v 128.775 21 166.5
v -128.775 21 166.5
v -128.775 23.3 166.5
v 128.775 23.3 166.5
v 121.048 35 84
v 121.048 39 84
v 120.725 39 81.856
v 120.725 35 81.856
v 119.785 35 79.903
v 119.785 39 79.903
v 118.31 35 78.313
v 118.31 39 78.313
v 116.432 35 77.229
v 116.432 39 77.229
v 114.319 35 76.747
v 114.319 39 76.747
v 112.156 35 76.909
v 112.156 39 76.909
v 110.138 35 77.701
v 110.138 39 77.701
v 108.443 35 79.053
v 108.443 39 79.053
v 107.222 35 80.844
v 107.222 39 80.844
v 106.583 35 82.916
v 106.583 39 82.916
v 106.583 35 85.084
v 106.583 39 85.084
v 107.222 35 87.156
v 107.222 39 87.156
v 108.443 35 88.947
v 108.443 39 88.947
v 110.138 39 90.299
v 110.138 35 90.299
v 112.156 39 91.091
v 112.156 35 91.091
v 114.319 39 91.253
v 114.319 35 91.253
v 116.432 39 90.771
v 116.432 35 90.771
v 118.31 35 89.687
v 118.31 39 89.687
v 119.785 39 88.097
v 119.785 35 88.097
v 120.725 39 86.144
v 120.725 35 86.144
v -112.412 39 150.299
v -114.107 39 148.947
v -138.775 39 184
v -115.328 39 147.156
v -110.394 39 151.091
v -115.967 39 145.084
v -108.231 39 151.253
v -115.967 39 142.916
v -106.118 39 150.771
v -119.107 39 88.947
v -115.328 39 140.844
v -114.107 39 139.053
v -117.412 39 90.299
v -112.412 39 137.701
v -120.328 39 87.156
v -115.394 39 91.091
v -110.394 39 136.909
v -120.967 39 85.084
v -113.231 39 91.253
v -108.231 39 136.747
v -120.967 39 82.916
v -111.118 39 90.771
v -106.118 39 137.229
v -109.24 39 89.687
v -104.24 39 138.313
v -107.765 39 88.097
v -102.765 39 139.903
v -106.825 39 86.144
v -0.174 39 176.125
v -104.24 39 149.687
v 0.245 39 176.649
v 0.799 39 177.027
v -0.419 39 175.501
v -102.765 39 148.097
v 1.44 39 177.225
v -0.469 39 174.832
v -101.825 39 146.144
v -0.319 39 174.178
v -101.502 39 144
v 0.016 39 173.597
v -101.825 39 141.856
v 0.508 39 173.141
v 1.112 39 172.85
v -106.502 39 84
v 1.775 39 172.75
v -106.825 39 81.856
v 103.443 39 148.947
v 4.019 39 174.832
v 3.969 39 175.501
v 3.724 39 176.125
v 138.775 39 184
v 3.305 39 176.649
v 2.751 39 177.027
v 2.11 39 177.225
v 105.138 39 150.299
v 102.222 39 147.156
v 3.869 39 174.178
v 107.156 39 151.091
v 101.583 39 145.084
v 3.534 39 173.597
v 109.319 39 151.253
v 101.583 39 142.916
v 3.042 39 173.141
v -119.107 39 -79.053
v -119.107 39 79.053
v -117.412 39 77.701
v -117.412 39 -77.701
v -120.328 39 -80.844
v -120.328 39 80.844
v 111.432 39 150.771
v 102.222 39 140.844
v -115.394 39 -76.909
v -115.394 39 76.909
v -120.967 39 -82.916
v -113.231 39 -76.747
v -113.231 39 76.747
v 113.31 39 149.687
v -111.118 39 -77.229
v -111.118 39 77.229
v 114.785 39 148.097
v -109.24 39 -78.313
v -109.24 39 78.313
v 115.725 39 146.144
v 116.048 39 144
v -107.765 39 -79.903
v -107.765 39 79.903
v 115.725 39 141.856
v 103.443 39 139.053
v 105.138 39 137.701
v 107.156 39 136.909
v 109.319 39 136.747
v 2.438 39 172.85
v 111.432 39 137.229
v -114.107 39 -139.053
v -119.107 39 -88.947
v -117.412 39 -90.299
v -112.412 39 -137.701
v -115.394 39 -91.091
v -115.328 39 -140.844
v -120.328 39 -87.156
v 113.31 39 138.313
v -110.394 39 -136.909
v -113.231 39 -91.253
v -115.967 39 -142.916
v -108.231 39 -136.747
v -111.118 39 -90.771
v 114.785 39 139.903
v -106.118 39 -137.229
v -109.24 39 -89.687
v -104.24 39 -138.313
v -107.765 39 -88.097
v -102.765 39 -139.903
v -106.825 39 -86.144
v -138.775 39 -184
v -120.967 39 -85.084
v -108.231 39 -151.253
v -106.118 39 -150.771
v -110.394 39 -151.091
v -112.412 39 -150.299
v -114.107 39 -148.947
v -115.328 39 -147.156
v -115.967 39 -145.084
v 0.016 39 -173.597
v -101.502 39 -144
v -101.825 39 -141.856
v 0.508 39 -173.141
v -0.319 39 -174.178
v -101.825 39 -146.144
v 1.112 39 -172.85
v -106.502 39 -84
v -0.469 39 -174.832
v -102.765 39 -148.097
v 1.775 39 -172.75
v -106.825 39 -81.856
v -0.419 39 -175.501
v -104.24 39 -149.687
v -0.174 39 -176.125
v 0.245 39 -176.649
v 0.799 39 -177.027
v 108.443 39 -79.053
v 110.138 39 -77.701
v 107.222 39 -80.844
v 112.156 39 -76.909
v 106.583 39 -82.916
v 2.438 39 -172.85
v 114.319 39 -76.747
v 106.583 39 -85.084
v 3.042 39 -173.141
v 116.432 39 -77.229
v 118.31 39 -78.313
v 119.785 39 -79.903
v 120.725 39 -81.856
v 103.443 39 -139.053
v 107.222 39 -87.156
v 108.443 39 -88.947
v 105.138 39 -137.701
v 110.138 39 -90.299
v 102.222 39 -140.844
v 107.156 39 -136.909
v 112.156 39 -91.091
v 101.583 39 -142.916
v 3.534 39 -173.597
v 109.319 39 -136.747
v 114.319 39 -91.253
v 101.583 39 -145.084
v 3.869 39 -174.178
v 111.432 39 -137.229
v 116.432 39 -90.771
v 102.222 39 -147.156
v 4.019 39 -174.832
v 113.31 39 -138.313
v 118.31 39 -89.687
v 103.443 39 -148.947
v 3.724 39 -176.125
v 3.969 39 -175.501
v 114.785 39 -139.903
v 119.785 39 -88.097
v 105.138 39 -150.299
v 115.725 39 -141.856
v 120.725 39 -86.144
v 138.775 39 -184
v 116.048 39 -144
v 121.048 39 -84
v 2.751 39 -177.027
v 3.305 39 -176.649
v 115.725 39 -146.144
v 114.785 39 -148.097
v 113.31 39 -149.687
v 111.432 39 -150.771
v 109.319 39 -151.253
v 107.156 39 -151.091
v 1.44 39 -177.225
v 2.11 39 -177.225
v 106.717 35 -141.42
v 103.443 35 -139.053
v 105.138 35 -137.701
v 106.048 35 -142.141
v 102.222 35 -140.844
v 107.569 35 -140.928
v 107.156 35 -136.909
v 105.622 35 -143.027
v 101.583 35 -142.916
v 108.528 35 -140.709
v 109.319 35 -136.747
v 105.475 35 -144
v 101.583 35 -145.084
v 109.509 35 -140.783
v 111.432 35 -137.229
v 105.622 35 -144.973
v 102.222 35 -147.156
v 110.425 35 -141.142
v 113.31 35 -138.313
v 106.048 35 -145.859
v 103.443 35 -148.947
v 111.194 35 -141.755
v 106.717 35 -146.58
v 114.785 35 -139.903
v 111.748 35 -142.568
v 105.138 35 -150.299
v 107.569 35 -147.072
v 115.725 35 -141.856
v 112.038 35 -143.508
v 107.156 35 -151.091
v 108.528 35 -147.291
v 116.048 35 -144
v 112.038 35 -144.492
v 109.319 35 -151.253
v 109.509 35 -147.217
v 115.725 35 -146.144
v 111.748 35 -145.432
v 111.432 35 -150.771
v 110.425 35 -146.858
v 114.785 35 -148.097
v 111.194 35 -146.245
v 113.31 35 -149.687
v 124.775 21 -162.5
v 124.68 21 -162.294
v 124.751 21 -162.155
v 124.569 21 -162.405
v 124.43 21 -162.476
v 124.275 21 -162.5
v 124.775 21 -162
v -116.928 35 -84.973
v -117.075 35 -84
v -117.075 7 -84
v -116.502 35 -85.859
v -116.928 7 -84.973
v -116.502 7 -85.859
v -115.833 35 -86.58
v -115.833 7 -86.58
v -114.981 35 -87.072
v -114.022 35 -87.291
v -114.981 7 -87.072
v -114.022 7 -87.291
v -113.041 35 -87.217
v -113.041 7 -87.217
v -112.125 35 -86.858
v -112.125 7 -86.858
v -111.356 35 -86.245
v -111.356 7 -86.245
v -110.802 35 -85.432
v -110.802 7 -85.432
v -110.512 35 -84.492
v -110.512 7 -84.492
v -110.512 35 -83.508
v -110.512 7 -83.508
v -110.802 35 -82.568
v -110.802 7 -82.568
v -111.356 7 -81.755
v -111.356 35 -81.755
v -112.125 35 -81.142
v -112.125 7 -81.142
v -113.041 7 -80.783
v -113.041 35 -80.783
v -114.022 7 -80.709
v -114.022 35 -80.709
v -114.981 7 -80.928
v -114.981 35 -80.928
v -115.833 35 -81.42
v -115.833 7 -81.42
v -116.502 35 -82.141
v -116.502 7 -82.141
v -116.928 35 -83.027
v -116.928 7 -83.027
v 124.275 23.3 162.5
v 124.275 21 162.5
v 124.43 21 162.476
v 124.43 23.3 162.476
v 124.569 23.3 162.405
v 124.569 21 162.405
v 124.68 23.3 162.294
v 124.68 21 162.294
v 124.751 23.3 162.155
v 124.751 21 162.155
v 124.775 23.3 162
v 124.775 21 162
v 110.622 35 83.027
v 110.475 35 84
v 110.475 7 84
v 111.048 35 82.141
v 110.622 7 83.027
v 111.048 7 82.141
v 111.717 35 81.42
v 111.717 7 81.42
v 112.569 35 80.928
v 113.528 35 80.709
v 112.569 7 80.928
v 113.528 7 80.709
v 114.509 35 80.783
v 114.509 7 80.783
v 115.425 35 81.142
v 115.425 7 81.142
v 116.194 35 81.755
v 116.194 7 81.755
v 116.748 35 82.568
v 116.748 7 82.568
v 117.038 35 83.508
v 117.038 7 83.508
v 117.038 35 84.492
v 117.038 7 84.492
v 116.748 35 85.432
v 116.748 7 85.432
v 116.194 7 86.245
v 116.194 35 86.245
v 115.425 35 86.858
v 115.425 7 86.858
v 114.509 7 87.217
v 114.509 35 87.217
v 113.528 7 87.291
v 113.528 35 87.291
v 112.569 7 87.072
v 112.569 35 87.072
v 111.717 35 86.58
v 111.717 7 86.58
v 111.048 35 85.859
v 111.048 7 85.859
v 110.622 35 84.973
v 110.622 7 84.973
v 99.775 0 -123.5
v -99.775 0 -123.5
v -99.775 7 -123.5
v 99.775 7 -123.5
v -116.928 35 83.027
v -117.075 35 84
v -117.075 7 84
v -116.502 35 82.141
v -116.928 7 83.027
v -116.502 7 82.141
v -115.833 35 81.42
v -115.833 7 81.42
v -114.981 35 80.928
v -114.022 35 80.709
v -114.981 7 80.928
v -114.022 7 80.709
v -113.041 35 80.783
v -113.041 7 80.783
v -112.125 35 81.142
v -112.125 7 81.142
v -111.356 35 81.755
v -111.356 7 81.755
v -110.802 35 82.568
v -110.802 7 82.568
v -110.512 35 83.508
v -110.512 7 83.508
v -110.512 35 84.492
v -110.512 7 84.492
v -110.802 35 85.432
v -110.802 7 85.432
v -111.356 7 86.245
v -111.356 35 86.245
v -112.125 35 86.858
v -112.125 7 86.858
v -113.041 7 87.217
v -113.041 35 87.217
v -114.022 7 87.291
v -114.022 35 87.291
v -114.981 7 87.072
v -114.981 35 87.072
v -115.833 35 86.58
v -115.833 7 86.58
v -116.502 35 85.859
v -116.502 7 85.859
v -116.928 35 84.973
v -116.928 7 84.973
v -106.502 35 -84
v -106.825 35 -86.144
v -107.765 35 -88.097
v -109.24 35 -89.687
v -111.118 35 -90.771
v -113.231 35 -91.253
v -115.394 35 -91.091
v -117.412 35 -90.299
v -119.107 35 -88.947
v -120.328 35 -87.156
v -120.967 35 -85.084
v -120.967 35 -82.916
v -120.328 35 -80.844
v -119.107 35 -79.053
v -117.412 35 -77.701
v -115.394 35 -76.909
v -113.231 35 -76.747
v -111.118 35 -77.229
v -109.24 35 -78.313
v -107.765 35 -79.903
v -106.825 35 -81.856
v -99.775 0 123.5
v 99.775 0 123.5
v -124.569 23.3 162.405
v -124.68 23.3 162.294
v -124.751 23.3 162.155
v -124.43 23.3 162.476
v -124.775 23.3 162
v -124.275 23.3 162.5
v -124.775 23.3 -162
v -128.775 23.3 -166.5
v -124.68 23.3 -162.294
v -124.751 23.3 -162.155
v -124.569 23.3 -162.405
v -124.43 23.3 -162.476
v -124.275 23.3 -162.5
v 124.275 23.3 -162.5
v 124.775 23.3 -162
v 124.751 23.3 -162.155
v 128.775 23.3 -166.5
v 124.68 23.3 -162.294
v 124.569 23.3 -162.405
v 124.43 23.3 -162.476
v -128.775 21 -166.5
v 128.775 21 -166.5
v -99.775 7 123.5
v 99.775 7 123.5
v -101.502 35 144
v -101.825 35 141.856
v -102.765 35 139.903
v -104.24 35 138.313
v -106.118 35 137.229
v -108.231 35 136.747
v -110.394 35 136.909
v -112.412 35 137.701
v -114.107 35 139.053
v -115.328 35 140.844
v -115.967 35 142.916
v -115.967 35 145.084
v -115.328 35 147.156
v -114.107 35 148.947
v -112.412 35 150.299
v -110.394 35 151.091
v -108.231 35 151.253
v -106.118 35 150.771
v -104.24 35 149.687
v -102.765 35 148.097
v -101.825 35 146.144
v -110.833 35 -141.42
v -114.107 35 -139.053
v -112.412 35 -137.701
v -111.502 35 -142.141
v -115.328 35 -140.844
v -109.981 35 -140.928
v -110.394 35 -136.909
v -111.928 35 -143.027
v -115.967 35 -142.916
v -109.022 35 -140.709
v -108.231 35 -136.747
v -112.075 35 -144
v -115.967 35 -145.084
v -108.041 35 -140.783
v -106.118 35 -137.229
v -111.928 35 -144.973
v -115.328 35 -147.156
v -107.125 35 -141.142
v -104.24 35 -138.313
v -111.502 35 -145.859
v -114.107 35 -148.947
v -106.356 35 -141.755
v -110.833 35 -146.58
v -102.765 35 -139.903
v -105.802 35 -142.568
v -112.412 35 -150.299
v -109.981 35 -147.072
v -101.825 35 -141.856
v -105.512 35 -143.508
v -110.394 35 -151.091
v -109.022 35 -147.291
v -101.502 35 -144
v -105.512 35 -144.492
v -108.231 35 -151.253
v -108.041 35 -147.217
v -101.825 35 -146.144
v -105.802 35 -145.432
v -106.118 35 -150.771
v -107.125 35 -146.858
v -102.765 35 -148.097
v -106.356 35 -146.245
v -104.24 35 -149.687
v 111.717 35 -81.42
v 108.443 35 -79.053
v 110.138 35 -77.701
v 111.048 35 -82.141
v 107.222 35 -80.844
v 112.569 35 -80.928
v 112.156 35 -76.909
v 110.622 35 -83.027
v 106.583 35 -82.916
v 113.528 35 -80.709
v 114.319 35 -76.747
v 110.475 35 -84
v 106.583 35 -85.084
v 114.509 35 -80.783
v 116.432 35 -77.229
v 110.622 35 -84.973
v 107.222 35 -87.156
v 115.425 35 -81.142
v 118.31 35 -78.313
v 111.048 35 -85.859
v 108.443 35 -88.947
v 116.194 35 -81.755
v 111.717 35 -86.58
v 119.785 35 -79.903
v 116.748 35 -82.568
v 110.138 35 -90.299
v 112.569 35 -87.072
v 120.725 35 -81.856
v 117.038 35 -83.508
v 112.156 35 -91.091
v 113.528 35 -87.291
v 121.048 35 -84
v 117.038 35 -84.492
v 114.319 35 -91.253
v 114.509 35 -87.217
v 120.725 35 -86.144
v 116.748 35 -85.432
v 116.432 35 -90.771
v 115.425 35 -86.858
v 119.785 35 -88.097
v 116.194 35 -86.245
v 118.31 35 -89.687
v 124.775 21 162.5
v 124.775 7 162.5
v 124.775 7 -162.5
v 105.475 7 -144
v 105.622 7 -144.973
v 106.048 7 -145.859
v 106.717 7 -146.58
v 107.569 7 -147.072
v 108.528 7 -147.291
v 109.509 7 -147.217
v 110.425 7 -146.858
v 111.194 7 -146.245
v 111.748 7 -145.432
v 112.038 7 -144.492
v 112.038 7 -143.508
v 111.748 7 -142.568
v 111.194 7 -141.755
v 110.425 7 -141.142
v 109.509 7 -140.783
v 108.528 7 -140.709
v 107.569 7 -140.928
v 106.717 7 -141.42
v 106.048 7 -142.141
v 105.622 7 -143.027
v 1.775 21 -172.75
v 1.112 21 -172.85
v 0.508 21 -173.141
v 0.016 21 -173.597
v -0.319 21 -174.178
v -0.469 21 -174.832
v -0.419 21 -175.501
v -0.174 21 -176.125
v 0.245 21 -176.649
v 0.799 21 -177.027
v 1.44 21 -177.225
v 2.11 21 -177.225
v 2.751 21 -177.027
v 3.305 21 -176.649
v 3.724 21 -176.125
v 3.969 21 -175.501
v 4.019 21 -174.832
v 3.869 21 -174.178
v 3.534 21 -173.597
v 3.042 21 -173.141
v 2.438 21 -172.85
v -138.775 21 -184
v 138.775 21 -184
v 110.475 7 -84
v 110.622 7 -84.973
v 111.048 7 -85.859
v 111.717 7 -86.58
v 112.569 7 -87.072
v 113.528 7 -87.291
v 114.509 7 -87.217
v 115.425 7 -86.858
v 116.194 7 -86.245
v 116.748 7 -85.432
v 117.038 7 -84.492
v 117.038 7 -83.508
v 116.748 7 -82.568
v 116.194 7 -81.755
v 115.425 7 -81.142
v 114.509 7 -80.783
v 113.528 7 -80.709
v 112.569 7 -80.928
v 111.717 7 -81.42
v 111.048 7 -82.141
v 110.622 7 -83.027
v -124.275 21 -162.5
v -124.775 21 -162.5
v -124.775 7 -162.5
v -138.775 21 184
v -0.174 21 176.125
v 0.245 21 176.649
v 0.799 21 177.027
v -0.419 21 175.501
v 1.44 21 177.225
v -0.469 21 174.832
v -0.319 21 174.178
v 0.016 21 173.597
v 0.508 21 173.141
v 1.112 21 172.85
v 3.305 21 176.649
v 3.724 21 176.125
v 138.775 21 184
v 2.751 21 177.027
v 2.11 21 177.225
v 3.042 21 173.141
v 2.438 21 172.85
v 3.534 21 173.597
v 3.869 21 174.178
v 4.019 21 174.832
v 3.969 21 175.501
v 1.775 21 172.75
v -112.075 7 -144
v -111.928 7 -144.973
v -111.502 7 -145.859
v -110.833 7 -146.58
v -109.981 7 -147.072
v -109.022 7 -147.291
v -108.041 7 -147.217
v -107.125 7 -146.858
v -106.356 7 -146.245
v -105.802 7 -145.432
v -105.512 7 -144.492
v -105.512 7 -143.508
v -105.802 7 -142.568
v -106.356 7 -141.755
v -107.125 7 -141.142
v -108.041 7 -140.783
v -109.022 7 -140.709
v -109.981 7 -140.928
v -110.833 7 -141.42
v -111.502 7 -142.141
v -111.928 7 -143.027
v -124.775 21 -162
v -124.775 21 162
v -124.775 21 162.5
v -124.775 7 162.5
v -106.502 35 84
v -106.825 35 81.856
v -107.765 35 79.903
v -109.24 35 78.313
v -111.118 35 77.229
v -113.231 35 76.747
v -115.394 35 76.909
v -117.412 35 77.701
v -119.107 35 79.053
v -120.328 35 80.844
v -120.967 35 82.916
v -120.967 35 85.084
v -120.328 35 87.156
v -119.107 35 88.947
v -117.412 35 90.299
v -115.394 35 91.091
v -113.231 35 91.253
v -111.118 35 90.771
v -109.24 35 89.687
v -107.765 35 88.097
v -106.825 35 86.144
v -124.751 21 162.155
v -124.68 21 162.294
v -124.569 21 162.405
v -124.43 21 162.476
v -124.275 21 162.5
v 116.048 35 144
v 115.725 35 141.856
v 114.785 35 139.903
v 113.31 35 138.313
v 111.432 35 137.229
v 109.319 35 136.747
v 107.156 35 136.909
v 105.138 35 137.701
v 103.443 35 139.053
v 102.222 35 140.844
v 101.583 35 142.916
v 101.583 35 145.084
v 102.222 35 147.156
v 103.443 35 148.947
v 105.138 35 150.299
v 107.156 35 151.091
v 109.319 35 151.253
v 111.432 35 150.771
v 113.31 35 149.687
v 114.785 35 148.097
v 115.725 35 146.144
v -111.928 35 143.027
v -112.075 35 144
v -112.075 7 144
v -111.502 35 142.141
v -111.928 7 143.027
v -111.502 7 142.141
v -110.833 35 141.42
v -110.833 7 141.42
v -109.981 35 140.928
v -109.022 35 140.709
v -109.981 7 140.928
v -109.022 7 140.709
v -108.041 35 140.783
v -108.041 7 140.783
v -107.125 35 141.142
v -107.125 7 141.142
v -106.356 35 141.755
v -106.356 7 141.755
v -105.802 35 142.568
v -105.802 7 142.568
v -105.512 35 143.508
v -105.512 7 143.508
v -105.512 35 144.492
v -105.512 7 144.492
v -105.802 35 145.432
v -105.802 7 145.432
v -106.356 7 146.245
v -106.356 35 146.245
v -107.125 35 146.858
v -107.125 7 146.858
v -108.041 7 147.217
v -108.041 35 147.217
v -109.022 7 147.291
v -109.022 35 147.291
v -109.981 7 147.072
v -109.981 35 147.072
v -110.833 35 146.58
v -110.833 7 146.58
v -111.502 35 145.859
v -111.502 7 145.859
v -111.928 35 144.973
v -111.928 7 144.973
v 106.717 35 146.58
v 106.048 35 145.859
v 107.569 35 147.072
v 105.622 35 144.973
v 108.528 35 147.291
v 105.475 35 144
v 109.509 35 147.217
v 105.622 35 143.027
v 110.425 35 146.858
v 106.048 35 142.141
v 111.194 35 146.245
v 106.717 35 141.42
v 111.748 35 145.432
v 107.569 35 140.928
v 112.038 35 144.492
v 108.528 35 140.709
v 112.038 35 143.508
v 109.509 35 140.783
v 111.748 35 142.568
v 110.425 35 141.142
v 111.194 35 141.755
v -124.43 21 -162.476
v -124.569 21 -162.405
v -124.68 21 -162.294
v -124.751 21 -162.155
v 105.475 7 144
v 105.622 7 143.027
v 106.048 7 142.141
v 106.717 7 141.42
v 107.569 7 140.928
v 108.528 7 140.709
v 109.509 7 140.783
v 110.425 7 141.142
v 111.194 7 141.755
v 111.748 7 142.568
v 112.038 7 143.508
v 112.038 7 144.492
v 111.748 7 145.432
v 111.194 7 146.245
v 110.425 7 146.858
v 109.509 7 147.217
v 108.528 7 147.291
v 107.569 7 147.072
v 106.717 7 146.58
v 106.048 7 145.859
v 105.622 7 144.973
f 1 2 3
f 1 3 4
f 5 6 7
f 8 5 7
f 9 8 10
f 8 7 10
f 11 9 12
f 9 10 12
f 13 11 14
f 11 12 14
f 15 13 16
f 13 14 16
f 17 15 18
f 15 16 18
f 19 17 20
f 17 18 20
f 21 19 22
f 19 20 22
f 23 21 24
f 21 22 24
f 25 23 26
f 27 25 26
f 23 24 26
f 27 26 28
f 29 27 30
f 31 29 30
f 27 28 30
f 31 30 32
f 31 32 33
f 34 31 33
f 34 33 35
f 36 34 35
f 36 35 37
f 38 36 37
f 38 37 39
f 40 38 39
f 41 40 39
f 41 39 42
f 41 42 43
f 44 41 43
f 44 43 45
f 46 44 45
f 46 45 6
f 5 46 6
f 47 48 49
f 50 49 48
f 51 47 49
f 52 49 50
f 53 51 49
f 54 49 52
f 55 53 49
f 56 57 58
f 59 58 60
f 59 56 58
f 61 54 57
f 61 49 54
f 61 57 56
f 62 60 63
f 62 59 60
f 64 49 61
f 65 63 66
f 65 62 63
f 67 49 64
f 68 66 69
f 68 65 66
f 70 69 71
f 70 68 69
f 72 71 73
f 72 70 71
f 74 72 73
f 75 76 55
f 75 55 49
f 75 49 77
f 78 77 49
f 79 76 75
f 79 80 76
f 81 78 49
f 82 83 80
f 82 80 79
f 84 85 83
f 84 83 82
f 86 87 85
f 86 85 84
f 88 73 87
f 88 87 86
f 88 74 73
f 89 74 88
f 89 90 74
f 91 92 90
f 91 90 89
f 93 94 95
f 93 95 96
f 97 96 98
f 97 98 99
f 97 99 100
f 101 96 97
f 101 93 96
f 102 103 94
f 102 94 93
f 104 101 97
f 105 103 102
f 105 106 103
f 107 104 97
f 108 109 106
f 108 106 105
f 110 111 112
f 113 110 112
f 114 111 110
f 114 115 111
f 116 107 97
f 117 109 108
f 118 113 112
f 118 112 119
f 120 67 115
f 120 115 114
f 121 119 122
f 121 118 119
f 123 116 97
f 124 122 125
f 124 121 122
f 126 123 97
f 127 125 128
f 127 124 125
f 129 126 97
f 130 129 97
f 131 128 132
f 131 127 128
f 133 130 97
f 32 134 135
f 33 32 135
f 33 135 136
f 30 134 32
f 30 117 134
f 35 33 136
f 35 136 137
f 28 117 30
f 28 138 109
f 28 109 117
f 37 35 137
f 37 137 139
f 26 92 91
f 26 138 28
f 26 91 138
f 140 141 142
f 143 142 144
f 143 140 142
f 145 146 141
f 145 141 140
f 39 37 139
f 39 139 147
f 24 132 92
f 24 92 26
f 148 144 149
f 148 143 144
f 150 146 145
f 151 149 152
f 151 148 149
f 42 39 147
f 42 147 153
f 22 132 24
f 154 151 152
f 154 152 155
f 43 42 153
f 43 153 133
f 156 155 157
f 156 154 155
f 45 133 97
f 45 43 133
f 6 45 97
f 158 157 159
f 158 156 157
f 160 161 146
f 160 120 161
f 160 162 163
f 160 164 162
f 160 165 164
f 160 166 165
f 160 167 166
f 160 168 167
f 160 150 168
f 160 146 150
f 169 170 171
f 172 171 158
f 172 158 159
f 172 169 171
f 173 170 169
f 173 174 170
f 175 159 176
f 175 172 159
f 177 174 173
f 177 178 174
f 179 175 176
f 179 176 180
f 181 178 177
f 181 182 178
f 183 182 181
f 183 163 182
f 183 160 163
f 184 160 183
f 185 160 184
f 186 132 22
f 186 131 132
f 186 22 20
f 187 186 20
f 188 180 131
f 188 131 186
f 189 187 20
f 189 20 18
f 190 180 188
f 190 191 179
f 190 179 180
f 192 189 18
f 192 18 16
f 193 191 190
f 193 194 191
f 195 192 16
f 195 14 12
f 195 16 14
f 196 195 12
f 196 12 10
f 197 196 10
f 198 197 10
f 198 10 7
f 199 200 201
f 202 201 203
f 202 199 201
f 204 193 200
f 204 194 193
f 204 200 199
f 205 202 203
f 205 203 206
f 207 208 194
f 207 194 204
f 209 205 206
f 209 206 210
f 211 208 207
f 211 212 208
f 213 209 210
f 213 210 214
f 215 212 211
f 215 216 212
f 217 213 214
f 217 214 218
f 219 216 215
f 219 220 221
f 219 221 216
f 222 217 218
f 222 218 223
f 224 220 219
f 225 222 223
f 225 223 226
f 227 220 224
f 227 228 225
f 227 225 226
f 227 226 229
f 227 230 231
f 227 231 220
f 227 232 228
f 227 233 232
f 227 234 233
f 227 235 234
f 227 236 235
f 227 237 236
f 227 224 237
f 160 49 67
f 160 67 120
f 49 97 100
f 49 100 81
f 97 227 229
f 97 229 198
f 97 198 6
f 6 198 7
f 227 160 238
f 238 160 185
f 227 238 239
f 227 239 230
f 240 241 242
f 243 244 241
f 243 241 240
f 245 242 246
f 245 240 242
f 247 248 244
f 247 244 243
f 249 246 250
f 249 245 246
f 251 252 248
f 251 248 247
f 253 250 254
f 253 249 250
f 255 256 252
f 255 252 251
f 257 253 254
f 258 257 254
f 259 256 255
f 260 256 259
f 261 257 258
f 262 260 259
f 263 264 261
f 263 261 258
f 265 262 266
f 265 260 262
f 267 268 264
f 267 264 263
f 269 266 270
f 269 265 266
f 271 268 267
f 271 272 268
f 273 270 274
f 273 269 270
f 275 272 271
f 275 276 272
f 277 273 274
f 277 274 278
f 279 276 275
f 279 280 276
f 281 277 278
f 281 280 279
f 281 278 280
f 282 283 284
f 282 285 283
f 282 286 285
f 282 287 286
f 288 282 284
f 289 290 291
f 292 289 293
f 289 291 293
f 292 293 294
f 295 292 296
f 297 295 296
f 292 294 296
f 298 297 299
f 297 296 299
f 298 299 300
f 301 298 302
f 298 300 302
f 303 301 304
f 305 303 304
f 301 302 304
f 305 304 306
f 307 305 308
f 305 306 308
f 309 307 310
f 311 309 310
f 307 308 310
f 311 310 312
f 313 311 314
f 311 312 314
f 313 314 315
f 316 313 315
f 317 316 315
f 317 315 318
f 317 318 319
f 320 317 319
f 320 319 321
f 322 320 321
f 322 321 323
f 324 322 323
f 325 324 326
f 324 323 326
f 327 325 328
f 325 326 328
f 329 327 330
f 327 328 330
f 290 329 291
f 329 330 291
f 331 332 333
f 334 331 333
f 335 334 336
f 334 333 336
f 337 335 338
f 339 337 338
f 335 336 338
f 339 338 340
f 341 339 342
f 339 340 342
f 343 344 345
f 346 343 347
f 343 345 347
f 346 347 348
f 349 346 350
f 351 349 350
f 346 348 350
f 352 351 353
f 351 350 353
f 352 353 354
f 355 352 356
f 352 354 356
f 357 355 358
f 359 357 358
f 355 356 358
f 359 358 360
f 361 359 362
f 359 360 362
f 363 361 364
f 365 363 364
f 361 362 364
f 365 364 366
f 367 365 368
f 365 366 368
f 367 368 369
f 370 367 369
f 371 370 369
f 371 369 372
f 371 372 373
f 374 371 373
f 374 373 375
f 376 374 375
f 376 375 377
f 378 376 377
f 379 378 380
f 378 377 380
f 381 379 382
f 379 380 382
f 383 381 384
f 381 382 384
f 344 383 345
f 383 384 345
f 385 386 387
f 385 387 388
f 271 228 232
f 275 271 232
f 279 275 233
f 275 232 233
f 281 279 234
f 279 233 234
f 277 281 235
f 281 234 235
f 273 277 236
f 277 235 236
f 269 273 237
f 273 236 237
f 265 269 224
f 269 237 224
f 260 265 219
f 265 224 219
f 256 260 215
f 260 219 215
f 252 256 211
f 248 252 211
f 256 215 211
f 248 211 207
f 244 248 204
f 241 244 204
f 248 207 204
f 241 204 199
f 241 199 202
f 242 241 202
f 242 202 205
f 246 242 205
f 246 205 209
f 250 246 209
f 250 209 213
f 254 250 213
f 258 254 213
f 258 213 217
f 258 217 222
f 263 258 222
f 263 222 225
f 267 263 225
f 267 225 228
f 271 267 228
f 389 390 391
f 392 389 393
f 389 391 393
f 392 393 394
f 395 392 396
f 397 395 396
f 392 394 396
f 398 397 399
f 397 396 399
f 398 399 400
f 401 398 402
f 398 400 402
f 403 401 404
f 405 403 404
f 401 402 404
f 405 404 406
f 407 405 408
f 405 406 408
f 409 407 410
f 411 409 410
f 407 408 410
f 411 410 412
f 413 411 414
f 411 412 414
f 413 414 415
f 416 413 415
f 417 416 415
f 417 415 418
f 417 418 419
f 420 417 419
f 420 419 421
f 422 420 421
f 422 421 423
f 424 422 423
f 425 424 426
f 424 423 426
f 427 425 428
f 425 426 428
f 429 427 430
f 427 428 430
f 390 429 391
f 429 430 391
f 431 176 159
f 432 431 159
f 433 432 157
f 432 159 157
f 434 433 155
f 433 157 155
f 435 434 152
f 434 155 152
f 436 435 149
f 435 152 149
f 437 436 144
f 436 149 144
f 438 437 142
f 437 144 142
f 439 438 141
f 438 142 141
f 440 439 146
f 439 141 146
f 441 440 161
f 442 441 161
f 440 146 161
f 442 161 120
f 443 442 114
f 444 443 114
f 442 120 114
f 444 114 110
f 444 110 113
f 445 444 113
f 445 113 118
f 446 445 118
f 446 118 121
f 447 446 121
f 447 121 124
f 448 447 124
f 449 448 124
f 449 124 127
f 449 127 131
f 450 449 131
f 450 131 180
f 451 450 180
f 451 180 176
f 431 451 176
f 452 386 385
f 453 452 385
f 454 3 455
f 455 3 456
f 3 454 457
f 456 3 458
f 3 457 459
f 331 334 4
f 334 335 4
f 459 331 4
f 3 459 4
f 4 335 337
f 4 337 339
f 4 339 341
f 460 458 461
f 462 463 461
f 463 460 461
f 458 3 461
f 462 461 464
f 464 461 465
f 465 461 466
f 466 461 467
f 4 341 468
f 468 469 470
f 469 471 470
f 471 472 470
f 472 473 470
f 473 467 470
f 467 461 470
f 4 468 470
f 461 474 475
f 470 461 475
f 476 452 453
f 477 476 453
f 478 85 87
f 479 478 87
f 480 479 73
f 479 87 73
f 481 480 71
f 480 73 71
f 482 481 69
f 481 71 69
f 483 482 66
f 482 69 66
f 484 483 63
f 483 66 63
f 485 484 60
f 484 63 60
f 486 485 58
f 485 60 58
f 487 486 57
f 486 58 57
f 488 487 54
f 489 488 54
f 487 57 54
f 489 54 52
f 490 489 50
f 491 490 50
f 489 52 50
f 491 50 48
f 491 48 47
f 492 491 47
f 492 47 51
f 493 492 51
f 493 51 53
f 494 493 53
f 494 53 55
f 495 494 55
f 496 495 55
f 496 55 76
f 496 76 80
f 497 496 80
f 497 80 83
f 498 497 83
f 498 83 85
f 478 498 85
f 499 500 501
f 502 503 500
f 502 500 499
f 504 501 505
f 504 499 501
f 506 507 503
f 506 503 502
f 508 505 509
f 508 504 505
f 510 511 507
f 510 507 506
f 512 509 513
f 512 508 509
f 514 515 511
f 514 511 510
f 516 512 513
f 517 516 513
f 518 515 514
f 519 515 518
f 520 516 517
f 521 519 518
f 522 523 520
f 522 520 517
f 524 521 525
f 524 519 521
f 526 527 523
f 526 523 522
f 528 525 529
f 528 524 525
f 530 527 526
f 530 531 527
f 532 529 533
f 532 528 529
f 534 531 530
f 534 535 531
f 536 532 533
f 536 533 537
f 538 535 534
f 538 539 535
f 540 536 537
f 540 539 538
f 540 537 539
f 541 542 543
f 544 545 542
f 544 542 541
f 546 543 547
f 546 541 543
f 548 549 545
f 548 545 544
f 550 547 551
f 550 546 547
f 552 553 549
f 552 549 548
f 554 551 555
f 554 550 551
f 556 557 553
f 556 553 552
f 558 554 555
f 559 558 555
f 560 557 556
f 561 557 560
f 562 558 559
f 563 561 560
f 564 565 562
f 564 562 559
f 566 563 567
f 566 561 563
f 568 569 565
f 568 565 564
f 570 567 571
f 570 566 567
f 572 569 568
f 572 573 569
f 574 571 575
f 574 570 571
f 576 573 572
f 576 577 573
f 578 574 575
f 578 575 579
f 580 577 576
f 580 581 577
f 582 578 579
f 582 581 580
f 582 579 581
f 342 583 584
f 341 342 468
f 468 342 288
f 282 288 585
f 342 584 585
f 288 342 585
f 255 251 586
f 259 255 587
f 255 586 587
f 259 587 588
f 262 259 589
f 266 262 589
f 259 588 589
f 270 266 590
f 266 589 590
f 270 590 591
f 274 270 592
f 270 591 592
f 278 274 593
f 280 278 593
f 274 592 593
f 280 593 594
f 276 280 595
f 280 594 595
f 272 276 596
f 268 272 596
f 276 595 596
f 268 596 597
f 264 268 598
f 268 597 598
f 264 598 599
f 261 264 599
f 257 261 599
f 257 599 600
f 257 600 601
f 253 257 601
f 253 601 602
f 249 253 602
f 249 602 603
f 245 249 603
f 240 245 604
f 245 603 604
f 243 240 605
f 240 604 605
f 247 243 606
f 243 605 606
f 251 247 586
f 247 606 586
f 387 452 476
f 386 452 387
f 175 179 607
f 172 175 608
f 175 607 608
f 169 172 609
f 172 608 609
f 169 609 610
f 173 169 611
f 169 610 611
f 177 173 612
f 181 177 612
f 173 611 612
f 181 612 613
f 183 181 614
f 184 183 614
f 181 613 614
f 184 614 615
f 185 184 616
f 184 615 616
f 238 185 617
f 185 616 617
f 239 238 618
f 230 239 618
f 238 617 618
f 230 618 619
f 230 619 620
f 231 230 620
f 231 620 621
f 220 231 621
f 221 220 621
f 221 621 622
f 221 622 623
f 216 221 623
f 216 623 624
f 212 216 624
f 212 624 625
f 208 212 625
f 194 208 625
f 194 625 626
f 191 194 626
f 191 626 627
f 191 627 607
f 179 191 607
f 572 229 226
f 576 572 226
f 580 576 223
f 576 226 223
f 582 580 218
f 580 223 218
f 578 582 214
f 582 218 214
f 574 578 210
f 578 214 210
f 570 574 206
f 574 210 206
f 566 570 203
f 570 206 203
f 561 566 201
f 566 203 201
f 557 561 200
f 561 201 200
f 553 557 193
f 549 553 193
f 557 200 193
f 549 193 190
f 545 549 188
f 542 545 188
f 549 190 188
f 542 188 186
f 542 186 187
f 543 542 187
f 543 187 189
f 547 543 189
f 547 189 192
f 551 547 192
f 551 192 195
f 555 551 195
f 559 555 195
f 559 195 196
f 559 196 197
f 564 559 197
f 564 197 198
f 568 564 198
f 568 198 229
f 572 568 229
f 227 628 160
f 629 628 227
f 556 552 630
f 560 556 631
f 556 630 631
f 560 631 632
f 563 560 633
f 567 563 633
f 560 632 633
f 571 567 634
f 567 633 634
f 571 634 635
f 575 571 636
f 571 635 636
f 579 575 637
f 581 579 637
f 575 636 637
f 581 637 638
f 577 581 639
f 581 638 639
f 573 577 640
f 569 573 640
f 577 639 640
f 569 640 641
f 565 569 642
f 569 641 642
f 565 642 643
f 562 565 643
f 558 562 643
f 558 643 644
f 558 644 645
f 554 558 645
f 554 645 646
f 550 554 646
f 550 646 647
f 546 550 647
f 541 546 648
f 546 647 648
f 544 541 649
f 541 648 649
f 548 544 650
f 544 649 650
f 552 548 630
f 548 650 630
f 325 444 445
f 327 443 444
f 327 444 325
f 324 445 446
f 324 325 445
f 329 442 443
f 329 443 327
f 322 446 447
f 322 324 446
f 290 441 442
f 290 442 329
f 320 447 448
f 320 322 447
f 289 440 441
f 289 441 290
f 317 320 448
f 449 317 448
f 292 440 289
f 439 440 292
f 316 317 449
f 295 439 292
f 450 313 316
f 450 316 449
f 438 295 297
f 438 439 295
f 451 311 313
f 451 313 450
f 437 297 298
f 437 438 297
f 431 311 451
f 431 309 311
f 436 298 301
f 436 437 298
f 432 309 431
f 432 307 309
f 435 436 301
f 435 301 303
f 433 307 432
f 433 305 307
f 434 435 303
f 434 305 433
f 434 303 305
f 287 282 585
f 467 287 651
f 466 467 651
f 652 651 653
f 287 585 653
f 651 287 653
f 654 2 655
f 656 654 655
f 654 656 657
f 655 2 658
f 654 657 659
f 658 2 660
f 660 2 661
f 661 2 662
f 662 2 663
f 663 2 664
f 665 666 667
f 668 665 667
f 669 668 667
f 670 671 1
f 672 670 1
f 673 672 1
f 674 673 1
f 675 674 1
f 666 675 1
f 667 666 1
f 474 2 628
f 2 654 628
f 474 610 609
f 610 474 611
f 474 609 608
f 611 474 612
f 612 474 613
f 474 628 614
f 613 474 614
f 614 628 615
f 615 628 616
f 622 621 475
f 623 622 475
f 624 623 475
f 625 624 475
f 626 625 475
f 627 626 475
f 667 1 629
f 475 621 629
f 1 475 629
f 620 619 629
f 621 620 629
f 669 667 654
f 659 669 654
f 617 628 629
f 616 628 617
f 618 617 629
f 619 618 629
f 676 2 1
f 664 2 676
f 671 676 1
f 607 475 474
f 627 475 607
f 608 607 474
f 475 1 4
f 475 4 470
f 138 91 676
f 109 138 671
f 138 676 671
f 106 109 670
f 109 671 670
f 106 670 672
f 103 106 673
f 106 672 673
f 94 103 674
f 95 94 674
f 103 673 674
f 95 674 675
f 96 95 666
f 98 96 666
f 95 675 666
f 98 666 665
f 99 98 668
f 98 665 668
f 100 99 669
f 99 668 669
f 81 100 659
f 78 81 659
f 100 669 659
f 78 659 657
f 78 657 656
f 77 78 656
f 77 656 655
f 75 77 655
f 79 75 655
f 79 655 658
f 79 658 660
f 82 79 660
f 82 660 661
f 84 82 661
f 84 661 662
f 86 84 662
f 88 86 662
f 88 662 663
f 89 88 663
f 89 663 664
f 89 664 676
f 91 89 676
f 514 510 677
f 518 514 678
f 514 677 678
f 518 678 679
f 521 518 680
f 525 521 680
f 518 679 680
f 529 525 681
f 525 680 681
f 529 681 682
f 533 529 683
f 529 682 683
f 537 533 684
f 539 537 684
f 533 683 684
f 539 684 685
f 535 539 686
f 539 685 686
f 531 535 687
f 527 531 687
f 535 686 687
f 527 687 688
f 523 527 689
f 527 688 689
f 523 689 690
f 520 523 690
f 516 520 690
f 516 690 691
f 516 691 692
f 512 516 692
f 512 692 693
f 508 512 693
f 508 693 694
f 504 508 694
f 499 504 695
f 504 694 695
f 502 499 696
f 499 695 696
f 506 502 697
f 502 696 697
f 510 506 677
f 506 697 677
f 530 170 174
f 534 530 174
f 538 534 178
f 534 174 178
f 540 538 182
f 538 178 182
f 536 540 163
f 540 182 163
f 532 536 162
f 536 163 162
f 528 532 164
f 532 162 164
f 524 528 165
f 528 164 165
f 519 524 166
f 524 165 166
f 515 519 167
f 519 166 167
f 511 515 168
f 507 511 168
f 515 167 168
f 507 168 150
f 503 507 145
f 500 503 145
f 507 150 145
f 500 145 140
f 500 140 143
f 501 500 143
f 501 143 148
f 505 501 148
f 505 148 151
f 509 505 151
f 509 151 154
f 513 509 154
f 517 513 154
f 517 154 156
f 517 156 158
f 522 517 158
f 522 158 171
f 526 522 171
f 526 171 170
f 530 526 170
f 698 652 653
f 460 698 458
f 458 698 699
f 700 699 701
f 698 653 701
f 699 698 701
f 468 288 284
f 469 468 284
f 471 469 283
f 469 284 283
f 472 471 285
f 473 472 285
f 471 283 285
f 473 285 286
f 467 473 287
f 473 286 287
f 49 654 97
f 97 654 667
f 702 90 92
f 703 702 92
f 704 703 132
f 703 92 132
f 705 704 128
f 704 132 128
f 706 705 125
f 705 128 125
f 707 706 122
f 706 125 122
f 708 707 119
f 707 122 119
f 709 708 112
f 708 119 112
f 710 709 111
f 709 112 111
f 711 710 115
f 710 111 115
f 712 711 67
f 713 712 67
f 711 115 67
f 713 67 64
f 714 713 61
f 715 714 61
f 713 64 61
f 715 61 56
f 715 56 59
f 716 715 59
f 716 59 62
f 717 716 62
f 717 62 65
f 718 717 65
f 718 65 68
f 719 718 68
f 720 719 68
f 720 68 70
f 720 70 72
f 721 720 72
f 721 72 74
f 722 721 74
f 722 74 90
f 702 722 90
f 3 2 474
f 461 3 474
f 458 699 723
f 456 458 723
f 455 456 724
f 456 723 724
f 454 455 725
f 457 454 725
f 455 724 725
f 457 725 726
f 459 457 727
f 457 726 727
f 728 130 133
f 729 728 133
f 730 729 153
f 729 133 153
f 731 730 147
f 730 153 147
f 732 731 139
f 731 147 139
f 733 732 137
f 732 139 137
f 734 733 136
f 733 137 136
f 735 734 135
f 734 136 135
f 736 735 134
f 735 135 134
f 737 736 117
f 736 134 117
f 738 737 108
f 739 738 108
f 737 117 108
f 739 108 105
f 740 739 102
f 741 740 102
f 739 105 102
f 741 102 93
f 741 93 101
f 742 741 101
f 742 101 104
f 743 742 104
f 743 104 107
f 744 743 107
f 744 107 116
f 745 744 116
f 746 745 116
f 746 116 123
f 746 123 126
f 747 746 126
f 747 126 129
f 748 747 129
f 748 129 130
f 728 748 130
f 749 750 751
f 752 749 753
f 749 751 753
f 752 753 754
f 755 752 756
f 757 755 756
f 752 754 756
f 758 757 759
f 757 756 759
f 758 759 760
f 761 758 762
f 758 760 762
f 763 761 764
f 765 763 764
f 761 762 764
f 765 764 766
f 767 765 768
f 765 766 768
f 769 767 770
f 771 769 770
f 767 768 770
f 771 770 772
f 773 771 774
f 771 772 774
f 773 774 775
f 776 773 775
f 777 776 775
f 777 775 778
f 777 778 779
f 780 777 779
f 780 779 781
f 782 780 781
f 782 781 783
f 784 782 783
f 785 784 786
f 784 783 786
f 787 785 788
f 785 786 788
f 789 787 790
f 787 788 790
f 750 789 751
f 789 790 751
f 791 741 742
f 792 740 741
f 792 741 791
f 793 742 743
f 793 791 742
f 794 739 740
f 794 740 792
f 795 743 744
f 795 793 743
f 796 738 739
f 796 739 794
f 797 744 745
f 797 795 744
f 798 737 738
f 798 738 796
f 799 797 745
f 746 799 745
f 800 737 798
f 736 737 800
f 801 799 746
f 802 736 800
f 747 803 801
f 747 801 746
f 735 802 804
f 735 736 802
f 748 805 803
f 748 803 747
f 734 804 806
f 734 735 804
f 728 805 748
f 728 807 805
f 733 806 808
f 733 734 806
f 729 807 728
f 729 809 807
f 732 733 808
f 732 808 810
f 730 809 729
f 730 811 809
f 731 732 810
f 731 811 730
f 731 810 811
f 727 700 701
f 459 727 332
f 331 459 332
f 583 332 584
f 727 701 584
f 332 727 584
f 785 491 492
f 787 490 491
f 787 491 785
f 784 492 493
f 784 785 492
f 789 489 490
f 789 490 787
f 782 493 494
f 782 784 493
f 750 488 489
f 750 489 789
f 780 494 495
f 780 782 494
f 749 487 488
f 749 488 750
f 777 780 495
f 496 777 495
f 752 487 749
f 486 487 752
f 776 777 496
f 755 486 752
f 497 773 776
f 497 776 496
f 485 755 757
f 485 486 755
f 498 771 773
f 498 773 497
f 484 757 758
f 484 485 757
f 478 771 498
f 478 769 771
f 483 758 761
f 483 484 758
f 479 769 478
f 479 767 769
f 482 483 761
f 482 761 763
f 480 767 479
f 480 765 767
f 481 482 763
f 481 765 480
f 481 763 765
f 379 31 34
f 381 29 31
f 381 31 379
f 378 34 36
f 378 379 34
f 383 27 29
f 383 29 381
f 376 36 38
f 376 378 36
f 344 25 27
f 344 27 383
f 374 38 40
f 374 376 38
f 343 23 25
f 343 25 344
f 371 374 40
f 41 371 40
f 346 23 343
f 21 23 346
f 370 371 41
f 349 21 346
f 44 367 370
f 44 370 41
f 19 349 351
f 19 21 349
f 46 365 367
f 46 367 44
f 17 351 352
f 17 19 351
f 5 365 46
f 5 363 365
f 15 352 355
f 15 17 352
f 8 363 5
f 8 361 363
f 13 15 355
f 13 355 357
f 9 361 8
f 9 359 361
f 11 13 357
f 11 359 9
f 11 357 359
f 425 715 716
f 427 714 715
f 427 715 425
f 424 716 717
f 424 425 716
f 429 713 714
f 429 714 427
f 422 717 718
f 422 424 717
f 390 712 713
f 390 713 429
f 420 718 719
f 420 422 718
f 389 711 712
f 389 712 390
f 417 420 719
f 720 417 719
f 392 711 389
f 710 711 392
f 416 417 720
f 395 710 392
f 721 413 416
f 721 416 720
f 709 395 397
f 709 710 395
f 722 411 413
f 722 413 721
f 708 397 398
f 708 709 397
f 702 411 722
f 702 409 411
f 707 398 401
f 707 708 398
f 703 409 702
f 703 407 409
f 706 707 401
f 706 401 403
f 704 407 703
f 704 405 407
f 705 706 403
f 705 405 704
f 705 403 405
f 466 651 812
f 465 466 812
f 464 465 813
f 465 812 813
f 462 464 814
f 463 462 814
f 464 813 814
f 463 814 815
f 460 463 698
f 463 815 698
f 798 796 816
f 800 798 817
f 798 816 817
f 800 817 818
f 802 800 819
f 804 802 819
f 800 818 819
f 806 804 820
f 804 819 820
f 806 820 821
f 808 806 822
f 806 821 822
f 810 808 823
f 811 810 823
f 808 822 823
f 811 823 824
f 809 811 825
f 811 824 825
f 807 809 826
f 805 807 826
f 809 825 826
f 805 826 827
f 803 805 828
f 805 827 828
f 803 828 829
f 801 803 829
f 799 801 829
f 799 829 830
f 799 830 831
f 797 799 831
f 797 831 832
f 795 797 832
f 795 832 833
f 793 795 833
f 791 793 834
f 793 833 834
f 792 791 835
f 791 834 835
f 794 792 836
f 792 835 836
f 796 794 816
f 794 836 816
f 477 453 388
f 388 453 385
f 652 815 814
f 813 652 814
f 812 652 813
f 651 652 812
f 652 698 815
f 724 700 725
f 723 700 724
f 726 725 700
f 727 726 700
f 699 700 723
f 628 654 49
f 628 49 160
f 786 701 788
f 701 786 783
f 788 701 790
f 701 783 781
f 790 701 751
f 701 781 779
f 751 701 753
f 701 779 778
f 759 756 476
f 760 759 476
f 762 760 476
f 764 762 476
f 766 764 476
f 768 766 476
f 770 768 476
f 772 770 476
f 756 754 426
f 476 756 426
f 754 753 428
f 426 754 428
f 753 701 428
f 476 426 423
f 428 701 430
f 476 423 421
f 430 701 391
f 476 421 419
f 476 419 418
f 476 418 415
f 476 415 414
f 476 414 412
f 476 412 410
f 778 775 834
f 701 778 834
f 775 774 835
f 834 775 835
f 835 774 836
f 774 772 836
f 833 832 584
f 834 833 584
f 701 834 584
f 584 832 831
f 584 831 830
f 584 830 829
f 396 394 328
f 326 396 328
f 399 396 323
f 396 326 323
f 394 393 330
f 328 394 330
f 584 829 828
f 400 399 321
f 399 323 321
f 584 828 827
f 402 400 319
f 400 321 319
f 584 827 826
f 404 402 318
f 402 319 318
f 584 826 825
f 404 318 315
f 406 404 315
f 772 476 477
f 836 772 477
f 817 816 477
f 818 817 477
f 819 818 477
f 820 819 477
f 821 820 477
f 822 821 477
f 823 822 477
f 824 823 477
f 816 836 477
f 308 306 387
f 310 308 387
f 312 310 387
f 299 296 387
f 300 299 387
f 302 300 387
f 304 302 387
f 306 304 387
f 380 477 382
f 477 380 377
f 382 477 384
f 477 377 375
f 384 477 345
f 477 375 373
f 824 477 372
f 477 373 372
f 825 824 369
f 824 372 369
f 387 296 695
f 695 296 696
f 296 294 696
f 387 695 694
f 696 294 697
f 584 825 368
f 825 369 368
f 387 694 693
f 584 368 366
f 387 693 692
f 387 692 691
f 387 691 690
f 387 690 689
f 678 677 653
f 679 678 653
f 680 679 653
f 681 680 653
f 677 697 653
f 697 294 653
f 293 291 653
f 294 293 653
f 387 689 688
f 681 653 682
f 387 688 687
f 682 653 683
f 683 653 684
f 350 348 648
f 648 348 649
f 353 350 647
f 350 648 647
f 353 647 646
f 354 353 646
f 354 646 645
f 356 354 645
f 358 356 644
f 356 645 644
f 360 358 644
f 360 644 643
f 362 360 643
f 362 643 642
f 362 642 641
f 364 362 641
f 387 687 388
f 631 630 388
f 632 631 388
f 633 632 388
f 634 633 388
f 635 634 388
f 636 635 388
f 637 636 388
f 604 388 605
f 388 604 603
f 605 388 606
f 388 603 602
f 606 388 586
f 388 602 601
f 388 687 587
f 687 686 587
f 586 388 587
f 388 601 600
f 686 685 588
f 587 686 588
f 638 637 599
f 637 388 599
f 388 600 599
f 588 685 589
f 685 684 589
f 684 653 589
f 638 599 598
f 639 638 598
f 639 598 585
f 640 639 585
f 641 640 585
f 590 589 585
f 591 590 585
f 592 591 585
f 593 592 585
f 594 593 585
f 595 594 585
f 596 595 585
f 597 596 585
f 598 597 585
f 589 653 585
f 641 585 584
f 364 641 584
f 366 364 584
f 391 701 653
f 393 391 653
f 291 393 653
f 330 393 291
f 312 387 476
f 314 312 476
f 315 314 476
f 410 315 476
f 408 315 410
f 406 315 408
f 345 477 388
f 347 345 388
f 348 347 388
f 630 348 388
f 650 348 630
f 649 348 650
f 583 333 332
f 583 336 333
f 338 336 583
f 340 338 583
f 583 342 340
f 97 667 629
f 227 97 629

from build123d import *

# Parameters (mm, degrees)
SKETCH1_W                               = 277.55
SKETCH1_H                               = 368
BOSS_EXTRUDE1_DEPTH                     = 39
SKETCH2_OUTSIDE_W                       = 372.066
SKETCH2_OUTSIDE_H                       = 462.516
SKETCH2_OUTSIDE_W_2                     = 199.55
SKETCH2_OUTSIDE_H_2                     = 247
CUT_EXTRUDE1_DEPTH                      = 7
SKETCH3_OUTSIDE_W                       = 372.066
SKETCH3_OUTSIDE_H                       = 462.516
SKETCH3_OUTSIDE_W_2                     = 249.55
SKETCH3_OUTSIDE_H_2                     = 325
CUT_EXTRUDE2_DEPTH                      = 21
CBORE_FOR_M6_HEX_HEAD_BOLT1_D           = 6.6
CBORE_FOR_M6_HEX_HEAD_BOLT1_CBORE_D     = 14.547
CBORE_FOR_M6_HEX_HEAD_BOLT1_CBORE_DEPTH = 4
SKETCH8_W                               = 257.55
SKETCH8_H                               = 333
CUT_EXTRUDE3_DEPTH                      = 2.3
SKETCH9_R                               = 2.25
CUT_EXTRUDE4_DEPTH                      = 232.420614088


with BuildPart() as part:
    # Sketch1 → Boss-Extrude1 (new body)
    with BuildSketch(Plane(origin=(0, 0, 0), x_dir=(1, 0, 0), z_dir=(0, 1, 0))):
        Rectangle(SKETCH1_W, SKETCH1_H)
    extrude(amount=BOSS_EXTRUDE1_DEPTH)

    # Sketch2 outside → Cut-Extrude1 (cut)
    with BuildSketch(Plane(origin=(0, 0, 0), x_dir=(1, 0, 0), z_dir=(0, 1, 0))):
        Rectangle(SKETCH2_OUTSIDE_W, SKETCH2_OUTSIDE_H)
        Rectangle(SKETCH2_OUTSIDE_W_2, SKETCH2_OUTSIDE_H_2, mode=Mode.SUBTRACT)
    extrude(amount=CUT_EXTRUDE1_DEPTH, mode=Mode.SUBTRACT)

    # Sketch3 outside → Cut-Extrude2 (cut)
    with BuildSketch(Plane(origin=(0, 0, 0), x_dir=(1, 0, 0), z_dir=(0, 1, 0))):
        Rectangle(SKETCH3_OUTSIDE_W, SKETCH3_OUTSIDE_H)
        Rectangle(SKETCH3_OUTSIDE_W_2, SKETCH3_OUTSIDE_H_2, mode=Mode.SUBTRACT)
    extrude(amount=CUT_EXTRUDE2_DEPTH, mode=Mode.SUBTRACT)

    # CBORE for M6 Hex Head Bolt1 (through all)
    with Locations(Plane(origin=(0, 39, 0), x_dir=(1, 0, 0), z_dir=(0, 1, 0))):
        with Locations((-108.775, -144), (-113.775, -84), (-113.775, 84), (-108.775, 144), (108.775, 144), (113.775, 84), (113.775, -84), (108.775, -144)):
            CounterBoreHole(CBORE_FOR_M6_HEX_HEAD_BOLT1_D / 2, CBORE_FOR_M6_HEX_HEAD_BOLT1_CBORE_D / 2, CBORE_FOR_M6_HEX_HEAD_BOLT1_CBORE_DEPTH)

    # Sketch8 → Cut-Extrude3 (cut)
    with BuildSketch(Plane(origin=(0, 21, 0), x_dir=(1, 0, 0), z_dir=(0, 1, 0))):
        Rectangle(SKETCH8_W, SKETCH8_H)
        with BuildLine():
            Line((124.275, 162.5), (-124.275, 162.5))
            ThreePointArc((-124.275, 162.5), (-124.628553391, 162.353553391), (-124.775, 162))
            Line((-124.775, 162), (-124.775, -162))
            ThreePointArc((-124.775, -162), (-124.628553391, -162.353553391), (-124.275, -162.5))
            Line((-124.275, -162.5), (124.275, -162.5))
            ThreePointArc((124.275, -162.5), (124.628553391, -162.353553391), (124.775, -162))
            Line((124.775, -162), (124.775, 162))
            ThreePointArc((124.775, 162), (124.628553391, 162.353553391), (124.275, 162.5))
        make_face(mode=Mode.SUBTRACT)
    extrude(amount=CUT_EXTRUDE3_DEPTH, mode=Mode.SUBTRACT)

    # Sketch9 → Cut-Extrude4 (cut, through all)
    with BuildSketch(Plane(origin=(0, 21, 0), x_dir=(-1, 0, 0), z_dir=(0, -1, 0))):
        with Locations(Location((-1.775, -175, 0), (0, 0, 90))):
            Circle(SKETCH9_R)
        with Locations(Location((-1.775, 175, 0), (0, 0, 270))):
            Circle(SKETCH9_R)
    extrude(amount=-CUT_EXTRUDE4_DEPTH, mode=Mode.SUBTRACT)


solid = part.part
